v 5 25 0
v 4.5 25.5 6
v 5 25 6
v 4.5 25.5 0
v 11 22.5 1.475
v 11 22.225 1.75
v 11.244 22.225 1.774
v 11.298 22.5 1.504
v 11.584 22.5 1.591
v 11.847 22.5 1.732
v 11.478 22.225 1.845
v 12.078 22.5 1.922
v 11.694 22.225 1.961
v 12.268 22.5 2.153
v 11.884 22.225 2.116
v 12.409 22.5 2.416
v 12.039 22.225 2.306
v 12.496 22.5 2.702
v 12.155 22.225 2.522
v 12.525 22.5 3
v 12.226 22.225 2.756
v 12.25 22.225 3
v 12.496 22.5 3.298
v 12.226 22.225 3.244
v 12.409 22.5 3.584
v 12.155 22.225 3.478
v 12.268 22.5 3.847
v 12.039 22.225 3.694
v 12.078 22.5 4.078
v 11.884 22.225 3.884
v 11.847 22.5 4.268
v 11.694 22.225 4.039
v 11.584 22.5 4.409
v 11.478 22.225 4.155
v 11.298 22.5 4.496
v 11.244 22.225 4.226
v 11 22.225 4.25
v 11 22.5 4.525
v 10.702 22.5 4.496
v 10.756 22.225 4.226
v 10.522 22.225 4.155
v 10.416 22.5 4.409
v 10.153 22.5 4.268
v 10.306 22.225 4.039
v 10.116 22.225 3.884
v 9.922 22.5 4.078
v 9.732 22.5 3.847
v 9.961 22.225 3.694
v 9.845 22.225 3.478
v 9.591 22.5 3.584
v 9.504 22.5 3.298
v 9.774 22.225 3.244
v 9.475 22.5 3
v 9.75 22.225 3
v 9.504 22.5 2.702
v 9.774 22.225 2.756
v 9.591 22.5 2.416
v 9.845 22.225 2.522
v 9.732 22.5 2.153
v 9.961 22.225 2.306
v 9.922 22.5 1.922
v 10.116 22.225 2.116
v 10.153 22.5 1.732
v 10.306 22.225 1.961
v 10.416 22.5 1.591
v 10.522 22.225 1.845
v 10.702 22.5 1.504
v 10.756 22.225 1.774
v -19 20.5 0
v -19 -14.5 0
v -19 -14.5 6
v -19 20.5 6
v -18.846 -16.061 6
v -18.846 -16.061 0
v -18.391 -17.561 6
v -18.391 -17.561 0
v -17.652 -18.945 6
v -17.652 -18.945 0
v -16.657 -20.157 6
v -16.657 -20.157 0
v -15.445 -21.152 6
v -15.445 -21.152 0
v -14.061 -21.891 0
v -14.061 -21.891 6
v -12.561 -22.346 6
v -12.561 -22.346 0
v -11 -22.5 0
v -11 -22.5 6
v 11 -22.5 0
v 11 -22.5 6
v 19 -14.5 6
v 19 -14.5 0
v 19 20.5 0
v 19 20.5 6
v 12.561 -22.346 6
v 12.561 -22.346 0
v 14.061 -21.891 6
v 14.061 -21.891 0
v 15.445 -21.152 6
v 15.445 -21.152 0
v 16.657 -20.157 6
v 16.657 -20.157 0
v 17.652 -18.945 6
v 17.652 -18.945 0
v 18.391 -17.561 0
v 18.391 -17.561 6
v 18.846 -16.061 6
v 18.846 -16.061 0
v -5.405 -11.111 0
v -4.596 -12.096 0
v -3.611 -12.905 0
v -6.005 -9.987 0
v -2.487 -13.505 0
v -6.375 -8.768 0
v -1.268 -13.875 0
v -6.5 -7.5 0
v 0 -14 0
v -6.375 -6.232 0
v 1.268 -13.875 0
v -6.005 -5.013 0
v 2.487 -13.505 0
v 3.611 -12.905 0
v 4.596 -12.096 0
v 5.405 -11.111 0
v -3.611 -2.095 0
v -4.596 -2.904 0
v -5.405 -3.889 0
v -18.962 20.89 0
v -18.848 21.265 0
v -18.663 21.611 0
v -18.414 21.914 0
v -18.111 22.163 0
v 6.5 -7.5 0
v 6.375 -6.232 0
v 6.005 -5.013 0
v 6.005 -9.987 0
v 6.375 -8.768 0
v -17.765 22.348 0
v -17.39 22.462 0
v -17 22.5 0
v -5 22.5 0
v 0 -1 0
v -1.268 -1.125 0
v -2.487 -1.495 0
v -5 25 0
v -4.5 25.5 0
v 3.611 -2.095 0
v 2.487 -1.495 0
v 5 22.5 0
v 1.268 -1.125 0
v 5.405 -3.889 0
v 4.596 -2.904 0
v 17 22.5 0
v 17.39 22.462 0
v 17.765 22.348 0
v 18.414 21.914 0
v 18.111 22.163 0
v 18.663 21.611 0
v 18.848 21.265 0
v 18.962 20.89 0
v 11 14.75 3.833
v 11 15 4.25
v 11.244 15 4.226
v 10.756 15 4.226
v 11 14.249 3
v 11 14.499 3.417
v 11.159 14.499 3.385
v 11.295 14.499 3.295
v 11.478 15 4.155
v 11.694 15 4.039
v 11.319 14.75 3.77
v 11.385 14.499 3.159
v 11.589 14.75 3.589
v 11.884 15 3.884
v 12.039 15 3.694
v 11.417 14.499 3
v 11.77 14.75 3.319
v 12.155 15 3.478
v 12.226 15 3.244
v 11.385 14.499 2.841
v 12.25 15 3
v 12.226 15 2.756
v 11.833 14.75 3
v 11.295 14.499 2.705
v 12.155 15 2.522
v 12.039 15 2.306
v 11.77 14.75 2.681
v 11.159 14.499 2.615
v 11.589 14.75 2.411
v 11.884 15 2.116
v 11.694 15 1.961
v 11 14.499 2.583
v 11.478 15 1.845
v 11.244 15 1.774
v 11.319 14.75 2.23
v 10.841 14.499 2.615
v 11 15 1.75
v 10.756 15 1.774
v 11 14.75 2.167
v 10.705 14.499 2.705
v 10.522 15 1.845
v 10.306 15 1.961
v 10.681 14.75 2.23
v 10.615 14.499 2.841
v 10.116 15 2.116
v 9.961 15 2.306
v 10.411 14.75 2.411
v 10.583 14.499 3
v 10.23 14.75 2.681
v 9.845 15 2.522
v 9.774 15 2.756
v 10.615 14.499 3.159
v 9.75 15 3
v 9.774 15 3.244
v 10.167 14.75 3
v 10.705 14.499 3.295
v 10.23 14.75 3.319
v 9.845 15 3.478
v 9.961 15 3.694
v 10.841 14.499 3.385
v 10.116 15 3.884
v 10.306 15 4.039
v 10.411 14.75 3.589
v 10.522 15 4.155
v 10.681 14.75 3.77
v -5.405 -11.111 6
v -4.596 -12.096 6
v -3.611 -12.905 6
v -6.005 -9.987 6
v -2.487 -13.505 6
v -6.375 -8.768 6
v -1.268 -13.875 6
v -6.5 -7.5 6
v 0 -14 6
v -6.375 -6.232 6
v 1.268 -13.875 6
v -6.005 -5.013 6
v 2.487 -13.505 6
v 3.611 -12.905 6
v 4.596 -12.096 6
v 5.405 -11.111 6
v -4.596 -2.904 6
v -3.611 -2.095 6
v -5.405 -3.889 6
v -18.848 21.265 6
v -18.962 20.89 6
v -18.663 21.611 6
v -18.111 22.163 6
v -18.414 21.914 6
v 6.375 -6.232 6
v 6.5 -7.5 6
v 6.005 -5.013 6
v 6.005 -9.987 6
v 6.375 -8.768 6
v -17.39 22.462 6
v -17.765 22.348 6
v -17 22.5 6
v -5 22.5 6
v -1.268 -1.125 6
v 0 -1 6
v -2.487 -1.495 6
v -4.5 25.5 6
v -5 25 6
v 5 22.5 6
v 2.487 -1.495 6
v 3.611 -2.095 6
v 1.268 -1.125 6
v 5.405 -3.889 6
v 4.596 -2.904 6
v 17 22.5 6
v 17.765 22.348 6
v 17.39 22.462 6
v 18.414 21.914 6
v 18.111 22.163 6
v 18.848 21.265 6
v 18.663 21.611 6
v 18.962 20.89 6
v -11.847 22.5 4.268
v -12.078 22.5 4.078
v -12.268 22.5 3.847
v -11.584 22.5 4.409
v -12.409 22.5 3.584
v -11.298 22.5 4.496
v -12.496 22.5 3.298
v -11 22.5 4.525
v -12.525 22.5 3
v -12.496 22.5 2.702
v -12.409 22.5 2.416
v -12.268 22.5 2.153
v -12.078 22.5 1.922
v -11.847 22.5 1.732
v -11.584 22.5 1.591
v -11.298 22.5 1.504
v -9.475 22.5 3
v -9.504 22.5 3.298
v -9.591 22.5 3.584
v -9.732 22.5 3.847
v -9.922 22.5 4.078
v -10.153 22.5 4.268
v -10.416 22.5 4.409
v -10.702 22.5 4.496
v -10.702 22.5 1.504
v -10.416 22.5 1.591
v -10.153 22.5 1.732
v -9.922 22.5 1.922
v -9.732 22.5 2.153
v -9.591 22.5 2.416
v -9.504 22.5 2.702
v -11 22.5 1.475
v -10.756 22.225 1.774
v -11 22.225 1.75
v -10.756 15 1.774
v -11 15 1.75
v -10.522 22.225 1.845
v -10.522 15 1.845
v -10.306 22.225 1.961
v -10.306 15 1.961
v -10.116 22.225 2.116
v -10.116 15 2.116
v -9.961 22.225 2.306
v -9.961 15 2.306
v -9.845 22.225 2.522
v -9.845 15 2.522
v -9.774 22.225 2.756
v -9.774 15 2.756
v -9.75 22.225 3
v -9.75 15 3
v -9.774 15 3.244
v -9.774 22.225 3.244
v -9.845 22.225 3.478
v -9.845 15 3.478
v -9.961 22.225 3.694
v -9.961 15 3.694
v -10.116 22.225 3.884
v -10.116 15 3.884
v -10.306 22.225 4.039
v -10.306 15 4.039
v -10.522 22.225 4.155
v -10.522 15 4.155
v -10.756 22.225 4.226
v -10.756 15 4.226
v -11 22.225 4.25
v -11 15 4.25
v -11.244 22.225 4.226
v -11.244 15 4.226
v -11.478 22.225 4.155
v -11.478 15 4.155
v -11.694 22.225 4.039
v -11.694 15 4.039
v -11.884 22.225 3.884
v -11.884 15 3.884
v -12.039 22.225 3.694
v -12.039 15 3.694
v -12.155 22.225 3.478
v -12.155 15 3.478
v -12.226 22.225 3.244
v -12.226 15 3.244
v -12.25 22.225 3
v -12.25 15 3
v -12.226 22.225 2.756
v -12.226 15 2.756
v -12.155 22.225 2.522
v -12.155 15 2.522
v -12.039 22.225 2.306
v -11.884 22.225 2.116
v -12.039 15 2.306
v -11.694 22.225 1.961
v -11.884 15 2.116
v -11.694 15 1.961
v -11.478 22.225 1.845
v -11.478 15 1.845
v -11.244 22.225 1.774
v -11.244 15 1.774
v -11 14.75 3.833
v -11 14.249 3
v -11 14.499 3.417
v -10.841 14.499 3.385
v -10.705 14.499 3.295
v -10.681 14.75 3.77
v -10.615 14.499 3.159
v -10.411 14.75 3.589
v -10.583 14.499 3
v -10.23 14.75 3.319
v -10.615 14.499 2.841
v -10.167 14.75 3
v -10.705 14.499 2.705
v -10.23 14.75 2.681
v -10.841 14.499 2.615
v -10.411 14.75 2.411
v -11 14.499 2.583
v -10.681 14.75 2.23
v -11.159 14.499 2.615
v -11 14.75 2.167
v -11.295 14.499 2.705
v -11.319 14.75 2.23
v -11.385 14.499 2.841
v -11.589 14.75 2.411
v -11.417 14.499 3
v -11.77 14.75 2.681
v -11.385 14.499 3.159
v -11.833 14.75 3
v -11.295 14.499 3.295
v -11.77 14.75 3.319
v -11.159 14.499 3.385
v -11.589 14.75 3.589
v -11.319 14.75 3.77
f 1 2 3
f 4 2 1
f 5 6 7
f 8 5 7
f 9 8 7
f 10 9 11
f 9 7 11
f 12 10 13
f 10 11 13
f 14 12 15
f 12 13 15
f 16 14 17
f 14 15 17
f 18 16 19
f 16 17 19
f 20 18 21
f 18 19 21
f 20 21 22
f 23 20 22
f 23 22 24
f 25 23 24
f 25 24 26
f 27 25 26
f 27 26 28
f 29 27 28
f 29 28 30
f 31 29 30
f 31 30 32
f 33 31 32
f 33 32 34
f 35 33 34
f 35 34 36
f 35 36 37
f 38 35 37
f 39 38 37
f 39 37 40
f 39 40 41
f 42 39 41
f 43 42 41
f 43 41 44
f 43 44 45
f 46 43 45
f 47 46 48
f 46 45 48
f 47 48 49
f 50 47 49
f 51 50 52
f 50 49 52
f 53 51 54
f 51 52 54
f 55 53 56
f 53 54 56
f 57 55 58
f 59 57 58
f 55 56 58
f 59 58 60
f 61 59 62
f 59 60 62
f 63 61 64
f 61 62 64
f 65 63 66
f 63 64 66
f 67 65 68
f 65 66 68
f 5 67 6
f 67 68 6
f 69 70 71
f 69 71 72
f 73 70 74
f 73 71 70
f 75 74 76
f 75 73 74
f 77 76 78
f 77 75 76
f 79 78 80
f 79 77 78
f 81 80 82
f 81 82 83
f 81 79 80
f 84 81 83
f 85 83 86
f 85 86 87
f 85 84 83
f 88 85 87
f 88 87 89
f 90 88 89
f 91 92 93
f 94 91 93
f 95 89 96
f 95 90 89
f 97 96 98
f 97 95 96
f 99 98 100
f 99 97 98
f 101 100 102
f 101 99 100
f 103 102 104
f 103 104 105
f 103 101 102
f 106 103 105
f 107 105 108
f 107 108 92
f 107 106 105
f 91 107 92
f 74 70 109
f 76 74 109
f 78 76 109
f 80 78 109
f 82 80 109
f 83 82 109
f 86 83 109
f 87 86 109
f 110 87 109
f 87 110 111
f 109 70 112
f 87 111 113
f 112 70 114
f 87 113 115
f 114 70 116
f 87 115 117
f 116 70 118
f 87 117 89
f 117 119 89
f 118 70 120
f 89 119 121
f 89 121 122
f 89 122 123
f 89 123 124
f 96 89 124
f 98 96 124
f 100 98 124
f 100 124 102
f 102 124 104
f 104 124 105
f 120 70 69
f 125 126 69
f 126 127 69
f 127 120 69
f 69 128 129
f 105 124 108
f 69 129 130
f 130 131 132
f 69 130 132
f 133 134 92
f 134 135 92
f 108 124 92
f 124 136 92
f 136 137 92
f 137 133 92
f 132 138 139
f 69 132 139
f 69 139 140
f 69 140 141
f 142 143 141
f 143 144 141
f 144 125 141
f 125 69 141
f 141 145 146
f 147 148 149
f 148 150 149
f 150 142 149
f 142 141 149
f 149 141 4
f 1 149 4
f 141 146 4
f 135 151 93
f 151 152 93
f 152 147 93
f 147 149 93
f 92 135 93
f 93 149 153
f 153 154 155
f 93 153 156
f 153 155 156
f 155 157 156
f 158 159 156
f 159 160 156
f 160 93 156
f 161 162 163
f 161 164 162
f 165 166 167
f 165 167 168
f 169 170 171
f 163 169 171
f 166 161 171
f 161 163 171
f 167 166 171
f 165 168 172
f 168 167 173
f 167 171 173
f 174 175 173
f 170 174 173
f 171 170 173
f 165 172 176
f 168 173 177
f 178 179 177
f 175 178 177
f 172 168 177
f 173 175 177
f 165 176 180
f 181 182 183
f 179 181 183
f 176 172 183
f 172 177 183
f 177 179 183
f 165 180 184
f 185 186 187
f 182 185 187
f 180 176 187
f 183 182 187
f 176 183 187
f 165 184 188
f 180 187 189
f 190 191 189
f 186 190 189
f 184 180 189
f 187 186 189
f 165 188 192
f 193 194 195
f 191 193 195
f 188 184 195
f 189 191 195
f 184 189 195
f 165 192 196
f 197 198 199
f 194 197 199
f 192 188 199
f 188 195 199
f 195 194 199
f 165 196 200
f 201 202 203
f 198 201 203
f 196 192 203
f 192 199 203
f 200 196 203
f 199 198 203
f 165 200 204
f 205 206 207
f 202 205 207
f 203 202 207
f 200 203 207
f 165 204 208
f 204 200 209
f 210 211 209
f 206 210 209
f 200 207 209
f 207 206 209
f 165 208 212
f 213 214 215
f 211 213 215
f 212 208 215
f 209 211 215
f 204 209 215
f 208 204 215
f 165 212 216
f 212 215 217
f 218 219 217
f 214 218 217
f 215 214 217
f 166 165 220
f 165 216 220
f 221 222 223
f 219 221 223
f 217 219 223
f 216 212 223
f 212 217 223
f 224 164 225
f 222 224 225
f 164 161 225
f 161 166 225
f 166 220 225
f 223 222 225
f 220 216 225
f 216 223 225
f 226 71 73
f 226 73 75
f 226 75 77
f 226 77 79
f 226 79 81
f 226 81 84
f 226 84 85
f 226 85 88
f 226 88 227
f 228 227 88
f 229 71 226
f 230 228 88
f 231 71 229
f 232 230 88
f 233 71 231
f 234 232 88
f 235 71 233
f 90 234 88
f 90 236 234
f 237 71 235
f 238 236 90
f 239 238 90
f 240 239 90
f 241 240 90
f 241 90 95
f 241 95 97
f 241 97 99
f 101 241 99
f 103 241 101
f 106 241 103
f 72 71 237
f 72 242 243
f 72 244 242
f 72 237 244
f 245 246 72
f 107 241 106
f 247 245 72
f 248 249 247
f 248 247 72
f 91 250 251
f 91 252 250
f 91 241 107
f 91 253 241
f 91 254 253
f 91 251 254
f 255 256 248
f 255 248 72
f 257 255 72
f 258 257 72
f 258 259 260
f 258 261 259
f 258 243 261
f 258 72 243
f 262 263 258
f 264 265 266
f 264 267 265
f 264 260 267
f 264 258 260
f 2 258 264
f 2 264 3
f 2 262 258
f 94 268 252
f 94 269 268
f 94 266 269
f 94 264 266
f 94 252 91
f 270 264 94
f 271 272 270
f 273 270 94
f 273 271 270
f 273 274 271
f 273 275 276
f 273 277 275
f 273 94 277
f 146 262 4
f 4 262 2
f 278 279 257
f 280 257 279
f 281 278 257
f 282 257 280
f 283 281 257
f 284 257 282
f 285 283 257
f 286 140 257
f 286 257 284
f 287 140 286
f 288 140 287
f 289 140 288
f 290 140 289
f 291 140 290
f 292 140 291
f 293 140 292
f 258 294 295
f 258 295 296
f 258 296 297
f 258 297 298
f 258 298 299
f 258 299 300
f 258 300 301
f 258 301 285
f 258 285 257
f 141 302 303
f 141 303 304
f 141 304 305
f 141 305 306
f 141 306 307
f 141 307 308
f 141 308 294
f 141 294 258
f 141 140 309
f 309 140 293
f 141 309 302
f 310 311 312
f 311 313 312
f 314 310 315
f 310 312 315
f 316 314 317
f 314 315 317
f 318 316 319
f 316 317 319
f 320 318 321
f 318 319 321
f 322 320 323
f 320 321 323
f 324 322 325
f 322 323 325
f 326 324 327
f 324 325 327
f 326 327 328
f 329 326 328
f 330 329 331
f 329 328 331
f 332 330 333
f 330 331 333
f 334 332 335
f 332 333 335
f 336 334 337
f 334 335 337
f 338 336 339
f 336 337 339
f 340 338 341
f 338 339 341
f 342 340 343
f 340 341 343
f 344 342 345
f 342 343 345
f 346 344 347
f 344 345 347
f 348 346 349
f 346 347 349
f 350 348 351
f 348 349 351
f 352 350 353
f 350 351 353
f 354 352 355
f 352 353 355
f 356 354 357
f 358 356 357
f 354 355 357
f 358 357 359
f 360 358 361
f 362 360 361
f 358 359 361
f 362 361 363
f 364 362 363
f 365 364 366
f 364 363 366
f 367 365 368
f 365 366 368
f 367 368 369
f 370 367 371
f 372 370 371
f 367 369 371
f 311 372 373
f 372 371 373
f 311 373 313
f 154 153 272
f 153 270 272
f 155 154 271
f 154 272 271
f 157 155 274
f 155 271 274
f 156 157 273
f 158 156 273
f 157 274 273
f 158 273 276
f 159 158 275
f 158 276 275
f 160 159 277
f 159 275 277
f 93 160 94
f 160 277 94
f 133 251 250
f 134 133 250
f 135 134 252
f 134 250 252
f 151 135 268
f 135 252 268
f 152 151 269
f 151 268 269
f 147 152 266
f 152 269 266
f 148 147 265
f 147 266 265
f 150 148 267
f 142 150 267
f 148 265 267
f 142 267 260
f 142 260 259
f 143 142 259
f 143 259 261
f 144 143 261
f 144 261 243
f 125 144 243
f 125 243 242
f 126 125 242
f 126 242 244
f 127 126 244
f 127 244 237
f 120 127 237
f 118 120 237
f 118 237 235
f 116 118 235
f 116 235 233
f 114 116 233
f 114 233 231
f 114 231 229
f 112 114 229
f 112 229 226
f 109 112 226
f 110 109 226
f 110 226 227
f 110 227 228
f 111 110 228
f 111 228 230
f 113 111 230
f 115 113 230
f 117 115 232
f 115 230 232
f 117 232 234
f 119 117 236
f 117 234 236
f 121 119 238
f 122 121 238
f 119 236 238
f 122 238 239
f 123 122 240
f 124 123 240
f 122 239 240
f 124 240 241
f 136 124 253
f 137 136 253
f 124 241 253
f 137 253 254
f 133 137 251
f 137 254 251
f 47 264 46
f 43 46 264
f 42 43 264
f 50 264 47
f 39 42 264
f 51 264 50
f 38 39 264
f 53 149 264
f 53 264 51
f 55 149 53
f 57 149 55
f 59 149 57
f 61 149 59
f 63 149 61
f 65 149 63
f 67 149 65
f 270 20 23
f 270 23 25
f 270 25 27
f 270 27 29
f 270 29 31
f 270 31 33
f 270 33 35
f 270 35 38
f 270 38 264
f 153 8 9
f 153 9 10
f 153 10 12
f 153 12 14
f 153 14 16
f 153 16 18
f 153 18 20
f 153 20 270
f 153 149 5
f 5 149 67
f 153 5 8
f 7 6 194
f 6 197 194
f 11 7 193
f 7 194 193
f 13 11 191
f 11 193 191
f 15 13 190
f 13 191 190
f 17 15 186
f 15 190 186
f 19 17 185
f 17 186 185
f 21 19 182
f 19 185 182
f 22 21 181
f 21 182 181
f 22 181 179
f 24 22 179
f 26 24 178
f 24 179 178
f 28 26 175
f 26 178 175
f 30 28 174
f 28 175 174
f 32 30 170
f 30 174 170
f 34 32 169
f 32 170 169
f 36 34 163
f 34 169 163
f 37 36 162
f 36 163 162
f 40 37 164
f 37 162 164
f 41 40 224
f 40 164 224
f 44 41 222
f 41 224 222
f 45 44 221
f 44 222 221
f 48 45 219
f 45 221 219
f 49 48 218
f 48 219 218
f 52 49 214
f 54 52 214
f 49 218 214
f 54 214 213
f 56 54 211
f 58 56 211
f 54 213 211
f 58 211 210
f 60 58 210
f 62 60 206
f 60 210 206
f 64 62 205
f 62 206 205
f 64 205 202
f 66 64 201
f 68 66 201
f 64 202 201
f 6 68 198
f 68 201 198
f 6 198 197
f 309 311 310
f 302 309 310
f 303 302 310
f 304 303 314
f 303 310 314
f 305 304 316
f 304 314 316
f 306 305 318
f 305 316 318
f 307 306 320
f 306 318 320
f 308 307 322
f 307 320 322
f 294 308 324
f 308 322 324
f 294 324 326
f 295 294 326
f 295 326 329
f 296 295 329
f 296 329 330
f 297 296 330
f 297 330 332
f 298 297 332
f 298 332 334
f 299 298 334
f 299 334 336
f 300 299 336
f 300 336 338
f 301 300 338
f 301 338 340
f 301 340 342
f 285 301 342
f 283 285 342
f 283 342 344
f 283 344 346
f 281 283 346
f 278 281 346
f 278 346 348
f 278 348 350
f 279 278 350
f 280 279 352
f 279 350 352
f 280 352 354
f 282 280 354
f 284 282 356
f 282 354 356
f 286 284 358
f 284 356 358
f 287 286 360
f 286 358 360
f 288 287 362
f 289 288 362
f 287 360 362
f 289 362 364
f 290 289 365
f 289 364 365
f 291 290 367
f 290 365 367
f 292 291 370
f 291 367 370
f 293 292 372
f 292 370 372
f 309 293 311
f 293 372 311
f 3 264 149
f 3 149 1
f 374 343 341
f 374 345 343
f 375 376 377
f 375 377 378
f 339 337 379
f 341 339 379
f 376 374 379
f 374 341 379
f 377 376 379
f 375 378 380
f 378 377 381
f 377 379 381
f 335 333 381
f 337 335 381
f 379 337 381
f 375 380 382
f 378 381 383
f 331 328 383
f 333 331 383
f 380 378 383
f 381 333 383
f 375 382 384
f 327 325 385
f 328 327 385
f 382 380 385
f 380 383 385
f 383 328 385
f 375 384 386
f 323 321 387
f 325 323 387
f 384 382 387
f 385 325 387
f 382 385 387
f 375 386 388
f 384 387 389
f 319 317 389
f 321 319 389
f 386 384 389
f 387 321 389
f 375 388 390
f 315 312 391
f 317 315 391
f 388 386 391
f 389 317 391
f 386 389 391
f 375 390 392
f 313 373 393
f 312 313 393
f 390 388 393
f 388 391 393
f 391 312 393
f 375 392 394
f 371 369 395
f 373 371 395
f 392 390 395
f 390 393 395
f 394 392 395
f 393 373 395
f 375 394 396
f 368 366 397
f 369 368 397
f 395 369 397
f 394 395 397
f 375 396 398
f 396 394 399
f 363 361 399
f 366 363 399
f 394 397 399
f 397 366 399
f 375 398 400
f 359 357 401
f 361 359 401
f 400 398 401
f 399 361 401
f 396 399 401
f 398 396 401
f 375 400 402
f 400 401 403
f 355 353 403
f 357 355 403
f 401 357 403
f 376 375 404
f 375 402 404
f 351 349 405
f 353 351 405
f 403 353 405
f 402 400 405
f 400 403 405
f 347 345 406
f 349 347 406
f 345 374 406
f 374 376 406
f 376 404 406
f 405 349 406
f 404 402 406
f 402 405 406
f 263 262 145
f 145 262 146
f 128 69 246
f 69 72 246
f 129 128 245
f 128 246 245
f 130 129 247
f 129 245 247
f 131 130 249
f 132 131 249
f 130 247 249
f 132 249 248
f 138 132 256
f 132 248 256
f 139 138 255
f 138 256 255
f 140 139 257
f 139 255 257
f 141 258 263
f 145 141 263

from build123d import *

# Parameters (mm, degrees)
SKETCH_1_W                   = 38
SKETCH_1_H                   = 45
EXTRUDE_1_DEPTH              = 6
SKETCH_2_R                   = 6.5
CUT_EXTRUDE_1_DEPTH          = 31.054117854
FILLET_1_R                   = 2
FILLET_2_R                   = 8
SKETCH_3_W                   = 10
SKETCH_3_H                   = 3
EXTRUDE_2_DEPTH              = 6
CHAMFER_1_SIZE               = 0.5
HOLE_WIZARD_M3_1_D           = 2.5
HOLE_WIZARD_M3_1_DEPTH       = 7.5
HOLE_WIZARD_M3_1_CSINK_D     = 3.05
HOLE_WIZARD_M3_1_CSINK_ANGLE = 90
HOLE_WIZARD_M3_1_TIP         = 0.751075774


with BuildPart() as part:
    # 草图1 → 凸台-拉伸1 (new body)
    with BuildSketch(Plane.XY):
        Rectangle(SKETCH_1_W, SKETCH_1_H)
    extrude(amount=EXTRUDE_1_DEPTH)

    # 草图2 → 切除-拉伸1 (cut, through all)
    with BuildSketch(Plane.XY.offset(6)):
        with Locations((0, -7.5)):
            Circle(SKETCH_2_R)
    extrude(amount=-CUT_EXTRUDE_1_DEPTH, mode=Mode.SUBTRACT)

    # 圆角1
    fillet_1_edges = [part.edges().sort_by_distance(p)[0] for p in [
        (-19, 22.5, 3),
        (19, 22.5, 3),
    ]]
    fillet(fillet_1_edges, radius=FILLET_1_R)

    # 圆角2
    fillet_2_edges = [part.edges().sort_by_distance(p)[0] for p in [
        (19, -22.5, 3),
        (-19, -22.5, 3),
    ]]
    fillet(fillet_2_edges, radius=FILLET_2_R)

    # 草图3 → 凸台-拉伸2 (add)
    with BuildSketch(Plane.XY.offset(6)):
        with Locations((0, 24)):
            Rectangle(SKETCH_3_W, SKETCH_3_H)
    extrude(amount=-EXTRUDE_2_DEPTH)

    # 倒角1
    chamfer_1_edges = [part.edges().sort_by_distance(p)[0] for p in [
        (-5, 25.5, 3),
        (5, 25.5, 3),
    ]]
    chamfer(chamfer_1_edges, length=CHAMFER_1_SIZE)

    # M3 螺纹孔1
    with Locations(Plane(origin=(-11, 22.5, 3), x_dir=(0, 0, 1), z_dir=(0, 1, 0))):
        with Locations((0, 0), (0, 22)):
            CounterSinkHole(HOLE_WIZARD_M3_1_D / 2, HOLE_WIZARD_M3_1_CSINK_D / 2, depth=HOLE_WIZARD_M3_1_DEPTH, counter_sink_angle=HOLE_WIZARD_M3_1_CSINK_ANGLE)
            with Locations((0, 0, -(HOLE_WIZARD_M3_1_DEPTH + HOLE_WIZARD_M3_1_TIP / 2))):  # 118° drill point
                Cone(0, HOLE_WIZARD_M3_1_D / 2, HOLE_WIZARD_M3_1_TIP, mode=Mode.SUBTRACT)


solid = part.part
